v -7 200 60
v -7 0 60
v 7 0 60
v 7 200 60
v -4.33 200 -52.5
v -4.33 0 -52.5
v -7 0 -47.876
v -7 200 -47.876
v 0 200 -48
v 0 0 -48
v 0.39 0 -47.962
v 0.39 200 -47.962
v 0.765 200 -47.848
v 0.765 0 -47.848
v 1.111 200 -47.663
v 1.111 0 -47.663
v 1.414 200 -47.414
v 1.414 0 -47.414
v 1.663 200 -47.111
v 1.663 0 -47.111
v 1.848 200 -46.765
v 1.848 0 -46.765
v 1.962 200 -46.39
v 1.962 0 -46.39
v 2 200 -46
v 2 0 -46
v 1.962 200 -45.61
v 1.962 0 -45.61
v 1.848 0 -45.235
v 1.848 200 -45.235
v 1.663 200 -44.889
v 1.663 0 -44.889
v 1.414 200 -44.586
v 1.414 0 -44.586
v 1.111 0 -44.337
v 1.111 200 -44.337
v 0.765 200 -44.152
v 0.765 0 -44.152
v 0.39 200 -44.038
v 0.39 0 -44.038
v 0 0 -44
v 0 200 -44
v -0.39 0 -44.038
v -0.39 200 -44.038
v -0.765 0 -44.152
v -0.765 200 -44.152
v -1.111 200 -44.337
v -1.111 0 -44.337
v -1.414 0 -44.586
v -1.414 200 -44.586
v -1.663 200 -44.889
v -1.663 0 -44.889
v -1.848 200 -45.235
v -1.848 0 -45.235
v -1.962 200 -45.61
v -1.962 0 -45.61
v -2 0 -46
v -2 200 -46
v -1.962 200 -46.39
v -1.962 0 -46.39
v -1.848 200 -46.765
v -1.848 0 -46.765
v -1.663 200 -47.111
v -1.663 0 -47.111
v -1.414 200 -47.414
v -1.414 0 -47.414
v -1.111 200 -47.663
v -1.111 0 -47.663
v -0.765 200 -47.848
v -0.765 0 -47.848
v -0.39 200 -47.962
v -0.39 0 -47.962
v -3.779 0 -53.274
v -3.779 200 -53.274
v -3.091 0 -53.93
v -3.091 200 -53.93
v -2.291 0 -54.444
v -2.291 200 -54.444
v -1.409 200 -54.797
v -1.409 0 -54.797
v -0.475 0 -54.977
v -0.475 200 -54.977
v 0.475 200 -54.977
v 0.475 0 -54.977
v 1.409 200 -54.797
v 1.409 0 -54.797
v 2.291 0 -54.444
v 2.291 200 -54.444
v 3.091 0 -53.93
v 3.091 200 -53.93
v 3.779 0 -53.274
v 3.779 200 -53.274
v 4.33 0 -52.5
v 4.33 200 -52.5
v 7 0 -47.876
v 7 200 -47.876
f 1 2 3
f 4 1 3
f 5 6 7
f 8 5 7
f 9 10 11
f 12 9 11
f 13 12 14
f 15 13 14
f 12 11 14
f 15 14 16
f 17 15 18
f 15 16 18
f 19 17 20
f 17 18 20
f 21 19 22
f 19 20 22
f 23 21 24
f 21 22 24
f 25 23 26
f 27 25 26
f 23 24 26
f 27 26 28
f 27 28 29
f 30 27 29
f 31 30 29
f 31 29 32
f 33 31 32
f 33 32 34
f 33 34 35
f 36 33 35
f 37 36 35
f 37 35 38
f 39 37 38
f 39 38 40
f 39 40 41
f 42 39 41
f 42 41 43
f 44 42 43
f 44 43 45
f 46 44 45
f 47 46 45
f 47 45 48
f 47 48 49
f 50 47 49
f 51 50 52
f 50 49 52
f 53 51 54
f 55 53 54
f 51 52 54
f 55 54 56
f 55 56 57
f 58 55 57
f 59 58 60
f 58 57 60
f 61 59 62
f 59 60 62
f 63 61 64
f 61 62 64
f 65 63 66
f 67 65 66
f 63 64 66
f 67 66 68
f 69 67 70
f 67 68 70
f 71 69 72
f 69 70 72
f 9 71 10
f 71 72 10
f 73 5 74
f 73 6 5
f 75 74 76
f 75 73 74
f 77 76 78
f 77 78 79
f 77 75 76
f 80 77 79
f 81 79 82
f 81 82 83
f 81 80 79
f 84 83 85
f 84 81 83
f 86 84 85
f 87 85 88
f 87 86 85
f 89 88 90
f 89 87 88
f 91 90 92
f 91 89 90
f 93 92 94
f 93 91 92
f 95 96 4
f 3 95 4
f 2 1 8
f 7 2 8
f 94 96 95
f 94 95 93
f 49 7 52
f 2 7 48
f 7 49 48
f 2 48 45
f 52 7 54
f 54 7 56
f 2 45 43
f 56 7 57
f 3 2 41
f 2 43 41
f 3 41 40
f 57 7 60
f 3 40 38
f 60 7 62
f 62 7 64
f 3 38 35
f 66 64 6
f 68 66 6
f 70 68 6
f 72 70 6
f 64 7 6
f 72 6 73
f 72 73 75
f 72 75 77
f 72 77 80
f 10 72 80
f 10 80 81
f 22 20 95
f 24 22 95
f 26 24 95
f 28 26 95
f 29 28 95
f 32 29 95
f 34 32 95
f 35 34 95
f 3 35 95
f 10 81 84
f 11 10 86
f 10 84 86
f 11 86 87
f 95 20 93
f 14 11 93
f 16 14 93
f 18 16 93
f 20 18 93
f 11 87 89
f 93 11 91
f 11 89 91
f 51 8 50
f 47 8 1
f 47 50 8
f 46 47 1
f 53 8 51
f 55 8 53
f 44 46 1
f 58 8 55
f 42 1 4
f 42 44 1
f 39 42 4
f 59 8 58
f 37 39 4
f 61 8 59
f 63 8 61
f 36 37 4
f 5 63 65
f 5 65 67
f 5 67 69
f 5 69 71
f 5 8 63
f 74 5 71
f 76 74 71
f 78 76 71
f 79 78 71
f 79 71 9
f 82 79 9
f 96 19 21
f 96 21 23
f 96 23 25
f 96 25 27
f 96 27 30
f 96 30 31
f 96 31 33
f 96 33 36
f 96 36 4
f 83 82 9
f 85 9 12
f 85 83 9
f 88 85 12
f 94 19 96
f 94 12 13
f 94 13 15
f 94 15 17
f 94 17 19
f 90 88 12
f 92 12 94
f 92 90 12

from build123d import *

# Parameters (mm, degrees)
SKETCH1_W           = 30
SKETCH1_H           = 120
BOSS_EXTRUDE1_DEPTH = 200
SKETCH2_OUTSIDE_W   = 79.032
SKETCH2_OUTSIDE_H   = 169.032
CUT_EXTRUDE2_DEPTH  = 210.344214155
FILLET1_R           = 5
CUT_EXTRUDE3_DEPTH  = 210.344214155
SKETCH4_R           = 2
CUT_EXTRUDE4_DEPTH  = 209.92343095


with BuildPart() as part:
    # Sketch1 → Boss-Extrude1 (new body)
    with BuildSketch(Plane(origin=(0, 0, 0), x_dir=(1, 0, 0), z_dir=(0, 1, 0))):
        Rectangle(SKETCH1_W, SKETCH1_H)
    extrude(amount=BOSS_EXTRUDE1_DEPTH)

    # Sketch2 outside → Cut-Extrude2 (cut, through all)
    with BuildSketch(Plane(origin=(0, 200, 0), x_dir=(1, 0, 0), z_dir=(0, 1, 0))):
        Rectangle(SKETCH2_OUTSIDE_W, SKETCH2_OUTSIDE_H)
        Polygon((0, 60), (-15, 34.019237886), (-15, -60), (15, -60), (15, 34.019237886), align=None, mode=Mode.SUBTRACT)
    extrude(amount=-CUT_EXTRUDE2_DEPTH, mode=Mode.SUBTRACT)

    # Fillet1
    fillet1_edges = [part.edges().sort_by_distance(p)[0] for p in [
        (0, 100, -60),
    ]]
    fillet(fillet1_edges, radius=FILLET1_R)

    # Sketch3 → Cut-Extrude3 (cut, through all)
    with BuildSketch(Plane(origin=(0, 200, 0), x_dir=(1, 0, 0), z_dir=(0, 1, 0))):
        Polygon((-15, 34.019237886), (-15, -60), (-7, -60), (-7, 47.875644347), align=None)
        Polygon((7, 47.875644347), (7, -60), (15, -60), (15, 34.019237886), align=None)
    extrude(amount=-CUT_EXTRUDE3_DEPTH, mode=Mode.SUBTRACT)

    # Sketch4 → Cut-Extrude4 (cut, through all)
    with BuildSketch(Plane.XZ):
        with Locations(Location((0, -46, 0), (0, 0, 270))):
            Circle(SKETCH4_R)
    extrude(amount=-CUT_EXTRUDE4_DEPTH, mode=Mode.SUBTRACT)


solid = part.part
